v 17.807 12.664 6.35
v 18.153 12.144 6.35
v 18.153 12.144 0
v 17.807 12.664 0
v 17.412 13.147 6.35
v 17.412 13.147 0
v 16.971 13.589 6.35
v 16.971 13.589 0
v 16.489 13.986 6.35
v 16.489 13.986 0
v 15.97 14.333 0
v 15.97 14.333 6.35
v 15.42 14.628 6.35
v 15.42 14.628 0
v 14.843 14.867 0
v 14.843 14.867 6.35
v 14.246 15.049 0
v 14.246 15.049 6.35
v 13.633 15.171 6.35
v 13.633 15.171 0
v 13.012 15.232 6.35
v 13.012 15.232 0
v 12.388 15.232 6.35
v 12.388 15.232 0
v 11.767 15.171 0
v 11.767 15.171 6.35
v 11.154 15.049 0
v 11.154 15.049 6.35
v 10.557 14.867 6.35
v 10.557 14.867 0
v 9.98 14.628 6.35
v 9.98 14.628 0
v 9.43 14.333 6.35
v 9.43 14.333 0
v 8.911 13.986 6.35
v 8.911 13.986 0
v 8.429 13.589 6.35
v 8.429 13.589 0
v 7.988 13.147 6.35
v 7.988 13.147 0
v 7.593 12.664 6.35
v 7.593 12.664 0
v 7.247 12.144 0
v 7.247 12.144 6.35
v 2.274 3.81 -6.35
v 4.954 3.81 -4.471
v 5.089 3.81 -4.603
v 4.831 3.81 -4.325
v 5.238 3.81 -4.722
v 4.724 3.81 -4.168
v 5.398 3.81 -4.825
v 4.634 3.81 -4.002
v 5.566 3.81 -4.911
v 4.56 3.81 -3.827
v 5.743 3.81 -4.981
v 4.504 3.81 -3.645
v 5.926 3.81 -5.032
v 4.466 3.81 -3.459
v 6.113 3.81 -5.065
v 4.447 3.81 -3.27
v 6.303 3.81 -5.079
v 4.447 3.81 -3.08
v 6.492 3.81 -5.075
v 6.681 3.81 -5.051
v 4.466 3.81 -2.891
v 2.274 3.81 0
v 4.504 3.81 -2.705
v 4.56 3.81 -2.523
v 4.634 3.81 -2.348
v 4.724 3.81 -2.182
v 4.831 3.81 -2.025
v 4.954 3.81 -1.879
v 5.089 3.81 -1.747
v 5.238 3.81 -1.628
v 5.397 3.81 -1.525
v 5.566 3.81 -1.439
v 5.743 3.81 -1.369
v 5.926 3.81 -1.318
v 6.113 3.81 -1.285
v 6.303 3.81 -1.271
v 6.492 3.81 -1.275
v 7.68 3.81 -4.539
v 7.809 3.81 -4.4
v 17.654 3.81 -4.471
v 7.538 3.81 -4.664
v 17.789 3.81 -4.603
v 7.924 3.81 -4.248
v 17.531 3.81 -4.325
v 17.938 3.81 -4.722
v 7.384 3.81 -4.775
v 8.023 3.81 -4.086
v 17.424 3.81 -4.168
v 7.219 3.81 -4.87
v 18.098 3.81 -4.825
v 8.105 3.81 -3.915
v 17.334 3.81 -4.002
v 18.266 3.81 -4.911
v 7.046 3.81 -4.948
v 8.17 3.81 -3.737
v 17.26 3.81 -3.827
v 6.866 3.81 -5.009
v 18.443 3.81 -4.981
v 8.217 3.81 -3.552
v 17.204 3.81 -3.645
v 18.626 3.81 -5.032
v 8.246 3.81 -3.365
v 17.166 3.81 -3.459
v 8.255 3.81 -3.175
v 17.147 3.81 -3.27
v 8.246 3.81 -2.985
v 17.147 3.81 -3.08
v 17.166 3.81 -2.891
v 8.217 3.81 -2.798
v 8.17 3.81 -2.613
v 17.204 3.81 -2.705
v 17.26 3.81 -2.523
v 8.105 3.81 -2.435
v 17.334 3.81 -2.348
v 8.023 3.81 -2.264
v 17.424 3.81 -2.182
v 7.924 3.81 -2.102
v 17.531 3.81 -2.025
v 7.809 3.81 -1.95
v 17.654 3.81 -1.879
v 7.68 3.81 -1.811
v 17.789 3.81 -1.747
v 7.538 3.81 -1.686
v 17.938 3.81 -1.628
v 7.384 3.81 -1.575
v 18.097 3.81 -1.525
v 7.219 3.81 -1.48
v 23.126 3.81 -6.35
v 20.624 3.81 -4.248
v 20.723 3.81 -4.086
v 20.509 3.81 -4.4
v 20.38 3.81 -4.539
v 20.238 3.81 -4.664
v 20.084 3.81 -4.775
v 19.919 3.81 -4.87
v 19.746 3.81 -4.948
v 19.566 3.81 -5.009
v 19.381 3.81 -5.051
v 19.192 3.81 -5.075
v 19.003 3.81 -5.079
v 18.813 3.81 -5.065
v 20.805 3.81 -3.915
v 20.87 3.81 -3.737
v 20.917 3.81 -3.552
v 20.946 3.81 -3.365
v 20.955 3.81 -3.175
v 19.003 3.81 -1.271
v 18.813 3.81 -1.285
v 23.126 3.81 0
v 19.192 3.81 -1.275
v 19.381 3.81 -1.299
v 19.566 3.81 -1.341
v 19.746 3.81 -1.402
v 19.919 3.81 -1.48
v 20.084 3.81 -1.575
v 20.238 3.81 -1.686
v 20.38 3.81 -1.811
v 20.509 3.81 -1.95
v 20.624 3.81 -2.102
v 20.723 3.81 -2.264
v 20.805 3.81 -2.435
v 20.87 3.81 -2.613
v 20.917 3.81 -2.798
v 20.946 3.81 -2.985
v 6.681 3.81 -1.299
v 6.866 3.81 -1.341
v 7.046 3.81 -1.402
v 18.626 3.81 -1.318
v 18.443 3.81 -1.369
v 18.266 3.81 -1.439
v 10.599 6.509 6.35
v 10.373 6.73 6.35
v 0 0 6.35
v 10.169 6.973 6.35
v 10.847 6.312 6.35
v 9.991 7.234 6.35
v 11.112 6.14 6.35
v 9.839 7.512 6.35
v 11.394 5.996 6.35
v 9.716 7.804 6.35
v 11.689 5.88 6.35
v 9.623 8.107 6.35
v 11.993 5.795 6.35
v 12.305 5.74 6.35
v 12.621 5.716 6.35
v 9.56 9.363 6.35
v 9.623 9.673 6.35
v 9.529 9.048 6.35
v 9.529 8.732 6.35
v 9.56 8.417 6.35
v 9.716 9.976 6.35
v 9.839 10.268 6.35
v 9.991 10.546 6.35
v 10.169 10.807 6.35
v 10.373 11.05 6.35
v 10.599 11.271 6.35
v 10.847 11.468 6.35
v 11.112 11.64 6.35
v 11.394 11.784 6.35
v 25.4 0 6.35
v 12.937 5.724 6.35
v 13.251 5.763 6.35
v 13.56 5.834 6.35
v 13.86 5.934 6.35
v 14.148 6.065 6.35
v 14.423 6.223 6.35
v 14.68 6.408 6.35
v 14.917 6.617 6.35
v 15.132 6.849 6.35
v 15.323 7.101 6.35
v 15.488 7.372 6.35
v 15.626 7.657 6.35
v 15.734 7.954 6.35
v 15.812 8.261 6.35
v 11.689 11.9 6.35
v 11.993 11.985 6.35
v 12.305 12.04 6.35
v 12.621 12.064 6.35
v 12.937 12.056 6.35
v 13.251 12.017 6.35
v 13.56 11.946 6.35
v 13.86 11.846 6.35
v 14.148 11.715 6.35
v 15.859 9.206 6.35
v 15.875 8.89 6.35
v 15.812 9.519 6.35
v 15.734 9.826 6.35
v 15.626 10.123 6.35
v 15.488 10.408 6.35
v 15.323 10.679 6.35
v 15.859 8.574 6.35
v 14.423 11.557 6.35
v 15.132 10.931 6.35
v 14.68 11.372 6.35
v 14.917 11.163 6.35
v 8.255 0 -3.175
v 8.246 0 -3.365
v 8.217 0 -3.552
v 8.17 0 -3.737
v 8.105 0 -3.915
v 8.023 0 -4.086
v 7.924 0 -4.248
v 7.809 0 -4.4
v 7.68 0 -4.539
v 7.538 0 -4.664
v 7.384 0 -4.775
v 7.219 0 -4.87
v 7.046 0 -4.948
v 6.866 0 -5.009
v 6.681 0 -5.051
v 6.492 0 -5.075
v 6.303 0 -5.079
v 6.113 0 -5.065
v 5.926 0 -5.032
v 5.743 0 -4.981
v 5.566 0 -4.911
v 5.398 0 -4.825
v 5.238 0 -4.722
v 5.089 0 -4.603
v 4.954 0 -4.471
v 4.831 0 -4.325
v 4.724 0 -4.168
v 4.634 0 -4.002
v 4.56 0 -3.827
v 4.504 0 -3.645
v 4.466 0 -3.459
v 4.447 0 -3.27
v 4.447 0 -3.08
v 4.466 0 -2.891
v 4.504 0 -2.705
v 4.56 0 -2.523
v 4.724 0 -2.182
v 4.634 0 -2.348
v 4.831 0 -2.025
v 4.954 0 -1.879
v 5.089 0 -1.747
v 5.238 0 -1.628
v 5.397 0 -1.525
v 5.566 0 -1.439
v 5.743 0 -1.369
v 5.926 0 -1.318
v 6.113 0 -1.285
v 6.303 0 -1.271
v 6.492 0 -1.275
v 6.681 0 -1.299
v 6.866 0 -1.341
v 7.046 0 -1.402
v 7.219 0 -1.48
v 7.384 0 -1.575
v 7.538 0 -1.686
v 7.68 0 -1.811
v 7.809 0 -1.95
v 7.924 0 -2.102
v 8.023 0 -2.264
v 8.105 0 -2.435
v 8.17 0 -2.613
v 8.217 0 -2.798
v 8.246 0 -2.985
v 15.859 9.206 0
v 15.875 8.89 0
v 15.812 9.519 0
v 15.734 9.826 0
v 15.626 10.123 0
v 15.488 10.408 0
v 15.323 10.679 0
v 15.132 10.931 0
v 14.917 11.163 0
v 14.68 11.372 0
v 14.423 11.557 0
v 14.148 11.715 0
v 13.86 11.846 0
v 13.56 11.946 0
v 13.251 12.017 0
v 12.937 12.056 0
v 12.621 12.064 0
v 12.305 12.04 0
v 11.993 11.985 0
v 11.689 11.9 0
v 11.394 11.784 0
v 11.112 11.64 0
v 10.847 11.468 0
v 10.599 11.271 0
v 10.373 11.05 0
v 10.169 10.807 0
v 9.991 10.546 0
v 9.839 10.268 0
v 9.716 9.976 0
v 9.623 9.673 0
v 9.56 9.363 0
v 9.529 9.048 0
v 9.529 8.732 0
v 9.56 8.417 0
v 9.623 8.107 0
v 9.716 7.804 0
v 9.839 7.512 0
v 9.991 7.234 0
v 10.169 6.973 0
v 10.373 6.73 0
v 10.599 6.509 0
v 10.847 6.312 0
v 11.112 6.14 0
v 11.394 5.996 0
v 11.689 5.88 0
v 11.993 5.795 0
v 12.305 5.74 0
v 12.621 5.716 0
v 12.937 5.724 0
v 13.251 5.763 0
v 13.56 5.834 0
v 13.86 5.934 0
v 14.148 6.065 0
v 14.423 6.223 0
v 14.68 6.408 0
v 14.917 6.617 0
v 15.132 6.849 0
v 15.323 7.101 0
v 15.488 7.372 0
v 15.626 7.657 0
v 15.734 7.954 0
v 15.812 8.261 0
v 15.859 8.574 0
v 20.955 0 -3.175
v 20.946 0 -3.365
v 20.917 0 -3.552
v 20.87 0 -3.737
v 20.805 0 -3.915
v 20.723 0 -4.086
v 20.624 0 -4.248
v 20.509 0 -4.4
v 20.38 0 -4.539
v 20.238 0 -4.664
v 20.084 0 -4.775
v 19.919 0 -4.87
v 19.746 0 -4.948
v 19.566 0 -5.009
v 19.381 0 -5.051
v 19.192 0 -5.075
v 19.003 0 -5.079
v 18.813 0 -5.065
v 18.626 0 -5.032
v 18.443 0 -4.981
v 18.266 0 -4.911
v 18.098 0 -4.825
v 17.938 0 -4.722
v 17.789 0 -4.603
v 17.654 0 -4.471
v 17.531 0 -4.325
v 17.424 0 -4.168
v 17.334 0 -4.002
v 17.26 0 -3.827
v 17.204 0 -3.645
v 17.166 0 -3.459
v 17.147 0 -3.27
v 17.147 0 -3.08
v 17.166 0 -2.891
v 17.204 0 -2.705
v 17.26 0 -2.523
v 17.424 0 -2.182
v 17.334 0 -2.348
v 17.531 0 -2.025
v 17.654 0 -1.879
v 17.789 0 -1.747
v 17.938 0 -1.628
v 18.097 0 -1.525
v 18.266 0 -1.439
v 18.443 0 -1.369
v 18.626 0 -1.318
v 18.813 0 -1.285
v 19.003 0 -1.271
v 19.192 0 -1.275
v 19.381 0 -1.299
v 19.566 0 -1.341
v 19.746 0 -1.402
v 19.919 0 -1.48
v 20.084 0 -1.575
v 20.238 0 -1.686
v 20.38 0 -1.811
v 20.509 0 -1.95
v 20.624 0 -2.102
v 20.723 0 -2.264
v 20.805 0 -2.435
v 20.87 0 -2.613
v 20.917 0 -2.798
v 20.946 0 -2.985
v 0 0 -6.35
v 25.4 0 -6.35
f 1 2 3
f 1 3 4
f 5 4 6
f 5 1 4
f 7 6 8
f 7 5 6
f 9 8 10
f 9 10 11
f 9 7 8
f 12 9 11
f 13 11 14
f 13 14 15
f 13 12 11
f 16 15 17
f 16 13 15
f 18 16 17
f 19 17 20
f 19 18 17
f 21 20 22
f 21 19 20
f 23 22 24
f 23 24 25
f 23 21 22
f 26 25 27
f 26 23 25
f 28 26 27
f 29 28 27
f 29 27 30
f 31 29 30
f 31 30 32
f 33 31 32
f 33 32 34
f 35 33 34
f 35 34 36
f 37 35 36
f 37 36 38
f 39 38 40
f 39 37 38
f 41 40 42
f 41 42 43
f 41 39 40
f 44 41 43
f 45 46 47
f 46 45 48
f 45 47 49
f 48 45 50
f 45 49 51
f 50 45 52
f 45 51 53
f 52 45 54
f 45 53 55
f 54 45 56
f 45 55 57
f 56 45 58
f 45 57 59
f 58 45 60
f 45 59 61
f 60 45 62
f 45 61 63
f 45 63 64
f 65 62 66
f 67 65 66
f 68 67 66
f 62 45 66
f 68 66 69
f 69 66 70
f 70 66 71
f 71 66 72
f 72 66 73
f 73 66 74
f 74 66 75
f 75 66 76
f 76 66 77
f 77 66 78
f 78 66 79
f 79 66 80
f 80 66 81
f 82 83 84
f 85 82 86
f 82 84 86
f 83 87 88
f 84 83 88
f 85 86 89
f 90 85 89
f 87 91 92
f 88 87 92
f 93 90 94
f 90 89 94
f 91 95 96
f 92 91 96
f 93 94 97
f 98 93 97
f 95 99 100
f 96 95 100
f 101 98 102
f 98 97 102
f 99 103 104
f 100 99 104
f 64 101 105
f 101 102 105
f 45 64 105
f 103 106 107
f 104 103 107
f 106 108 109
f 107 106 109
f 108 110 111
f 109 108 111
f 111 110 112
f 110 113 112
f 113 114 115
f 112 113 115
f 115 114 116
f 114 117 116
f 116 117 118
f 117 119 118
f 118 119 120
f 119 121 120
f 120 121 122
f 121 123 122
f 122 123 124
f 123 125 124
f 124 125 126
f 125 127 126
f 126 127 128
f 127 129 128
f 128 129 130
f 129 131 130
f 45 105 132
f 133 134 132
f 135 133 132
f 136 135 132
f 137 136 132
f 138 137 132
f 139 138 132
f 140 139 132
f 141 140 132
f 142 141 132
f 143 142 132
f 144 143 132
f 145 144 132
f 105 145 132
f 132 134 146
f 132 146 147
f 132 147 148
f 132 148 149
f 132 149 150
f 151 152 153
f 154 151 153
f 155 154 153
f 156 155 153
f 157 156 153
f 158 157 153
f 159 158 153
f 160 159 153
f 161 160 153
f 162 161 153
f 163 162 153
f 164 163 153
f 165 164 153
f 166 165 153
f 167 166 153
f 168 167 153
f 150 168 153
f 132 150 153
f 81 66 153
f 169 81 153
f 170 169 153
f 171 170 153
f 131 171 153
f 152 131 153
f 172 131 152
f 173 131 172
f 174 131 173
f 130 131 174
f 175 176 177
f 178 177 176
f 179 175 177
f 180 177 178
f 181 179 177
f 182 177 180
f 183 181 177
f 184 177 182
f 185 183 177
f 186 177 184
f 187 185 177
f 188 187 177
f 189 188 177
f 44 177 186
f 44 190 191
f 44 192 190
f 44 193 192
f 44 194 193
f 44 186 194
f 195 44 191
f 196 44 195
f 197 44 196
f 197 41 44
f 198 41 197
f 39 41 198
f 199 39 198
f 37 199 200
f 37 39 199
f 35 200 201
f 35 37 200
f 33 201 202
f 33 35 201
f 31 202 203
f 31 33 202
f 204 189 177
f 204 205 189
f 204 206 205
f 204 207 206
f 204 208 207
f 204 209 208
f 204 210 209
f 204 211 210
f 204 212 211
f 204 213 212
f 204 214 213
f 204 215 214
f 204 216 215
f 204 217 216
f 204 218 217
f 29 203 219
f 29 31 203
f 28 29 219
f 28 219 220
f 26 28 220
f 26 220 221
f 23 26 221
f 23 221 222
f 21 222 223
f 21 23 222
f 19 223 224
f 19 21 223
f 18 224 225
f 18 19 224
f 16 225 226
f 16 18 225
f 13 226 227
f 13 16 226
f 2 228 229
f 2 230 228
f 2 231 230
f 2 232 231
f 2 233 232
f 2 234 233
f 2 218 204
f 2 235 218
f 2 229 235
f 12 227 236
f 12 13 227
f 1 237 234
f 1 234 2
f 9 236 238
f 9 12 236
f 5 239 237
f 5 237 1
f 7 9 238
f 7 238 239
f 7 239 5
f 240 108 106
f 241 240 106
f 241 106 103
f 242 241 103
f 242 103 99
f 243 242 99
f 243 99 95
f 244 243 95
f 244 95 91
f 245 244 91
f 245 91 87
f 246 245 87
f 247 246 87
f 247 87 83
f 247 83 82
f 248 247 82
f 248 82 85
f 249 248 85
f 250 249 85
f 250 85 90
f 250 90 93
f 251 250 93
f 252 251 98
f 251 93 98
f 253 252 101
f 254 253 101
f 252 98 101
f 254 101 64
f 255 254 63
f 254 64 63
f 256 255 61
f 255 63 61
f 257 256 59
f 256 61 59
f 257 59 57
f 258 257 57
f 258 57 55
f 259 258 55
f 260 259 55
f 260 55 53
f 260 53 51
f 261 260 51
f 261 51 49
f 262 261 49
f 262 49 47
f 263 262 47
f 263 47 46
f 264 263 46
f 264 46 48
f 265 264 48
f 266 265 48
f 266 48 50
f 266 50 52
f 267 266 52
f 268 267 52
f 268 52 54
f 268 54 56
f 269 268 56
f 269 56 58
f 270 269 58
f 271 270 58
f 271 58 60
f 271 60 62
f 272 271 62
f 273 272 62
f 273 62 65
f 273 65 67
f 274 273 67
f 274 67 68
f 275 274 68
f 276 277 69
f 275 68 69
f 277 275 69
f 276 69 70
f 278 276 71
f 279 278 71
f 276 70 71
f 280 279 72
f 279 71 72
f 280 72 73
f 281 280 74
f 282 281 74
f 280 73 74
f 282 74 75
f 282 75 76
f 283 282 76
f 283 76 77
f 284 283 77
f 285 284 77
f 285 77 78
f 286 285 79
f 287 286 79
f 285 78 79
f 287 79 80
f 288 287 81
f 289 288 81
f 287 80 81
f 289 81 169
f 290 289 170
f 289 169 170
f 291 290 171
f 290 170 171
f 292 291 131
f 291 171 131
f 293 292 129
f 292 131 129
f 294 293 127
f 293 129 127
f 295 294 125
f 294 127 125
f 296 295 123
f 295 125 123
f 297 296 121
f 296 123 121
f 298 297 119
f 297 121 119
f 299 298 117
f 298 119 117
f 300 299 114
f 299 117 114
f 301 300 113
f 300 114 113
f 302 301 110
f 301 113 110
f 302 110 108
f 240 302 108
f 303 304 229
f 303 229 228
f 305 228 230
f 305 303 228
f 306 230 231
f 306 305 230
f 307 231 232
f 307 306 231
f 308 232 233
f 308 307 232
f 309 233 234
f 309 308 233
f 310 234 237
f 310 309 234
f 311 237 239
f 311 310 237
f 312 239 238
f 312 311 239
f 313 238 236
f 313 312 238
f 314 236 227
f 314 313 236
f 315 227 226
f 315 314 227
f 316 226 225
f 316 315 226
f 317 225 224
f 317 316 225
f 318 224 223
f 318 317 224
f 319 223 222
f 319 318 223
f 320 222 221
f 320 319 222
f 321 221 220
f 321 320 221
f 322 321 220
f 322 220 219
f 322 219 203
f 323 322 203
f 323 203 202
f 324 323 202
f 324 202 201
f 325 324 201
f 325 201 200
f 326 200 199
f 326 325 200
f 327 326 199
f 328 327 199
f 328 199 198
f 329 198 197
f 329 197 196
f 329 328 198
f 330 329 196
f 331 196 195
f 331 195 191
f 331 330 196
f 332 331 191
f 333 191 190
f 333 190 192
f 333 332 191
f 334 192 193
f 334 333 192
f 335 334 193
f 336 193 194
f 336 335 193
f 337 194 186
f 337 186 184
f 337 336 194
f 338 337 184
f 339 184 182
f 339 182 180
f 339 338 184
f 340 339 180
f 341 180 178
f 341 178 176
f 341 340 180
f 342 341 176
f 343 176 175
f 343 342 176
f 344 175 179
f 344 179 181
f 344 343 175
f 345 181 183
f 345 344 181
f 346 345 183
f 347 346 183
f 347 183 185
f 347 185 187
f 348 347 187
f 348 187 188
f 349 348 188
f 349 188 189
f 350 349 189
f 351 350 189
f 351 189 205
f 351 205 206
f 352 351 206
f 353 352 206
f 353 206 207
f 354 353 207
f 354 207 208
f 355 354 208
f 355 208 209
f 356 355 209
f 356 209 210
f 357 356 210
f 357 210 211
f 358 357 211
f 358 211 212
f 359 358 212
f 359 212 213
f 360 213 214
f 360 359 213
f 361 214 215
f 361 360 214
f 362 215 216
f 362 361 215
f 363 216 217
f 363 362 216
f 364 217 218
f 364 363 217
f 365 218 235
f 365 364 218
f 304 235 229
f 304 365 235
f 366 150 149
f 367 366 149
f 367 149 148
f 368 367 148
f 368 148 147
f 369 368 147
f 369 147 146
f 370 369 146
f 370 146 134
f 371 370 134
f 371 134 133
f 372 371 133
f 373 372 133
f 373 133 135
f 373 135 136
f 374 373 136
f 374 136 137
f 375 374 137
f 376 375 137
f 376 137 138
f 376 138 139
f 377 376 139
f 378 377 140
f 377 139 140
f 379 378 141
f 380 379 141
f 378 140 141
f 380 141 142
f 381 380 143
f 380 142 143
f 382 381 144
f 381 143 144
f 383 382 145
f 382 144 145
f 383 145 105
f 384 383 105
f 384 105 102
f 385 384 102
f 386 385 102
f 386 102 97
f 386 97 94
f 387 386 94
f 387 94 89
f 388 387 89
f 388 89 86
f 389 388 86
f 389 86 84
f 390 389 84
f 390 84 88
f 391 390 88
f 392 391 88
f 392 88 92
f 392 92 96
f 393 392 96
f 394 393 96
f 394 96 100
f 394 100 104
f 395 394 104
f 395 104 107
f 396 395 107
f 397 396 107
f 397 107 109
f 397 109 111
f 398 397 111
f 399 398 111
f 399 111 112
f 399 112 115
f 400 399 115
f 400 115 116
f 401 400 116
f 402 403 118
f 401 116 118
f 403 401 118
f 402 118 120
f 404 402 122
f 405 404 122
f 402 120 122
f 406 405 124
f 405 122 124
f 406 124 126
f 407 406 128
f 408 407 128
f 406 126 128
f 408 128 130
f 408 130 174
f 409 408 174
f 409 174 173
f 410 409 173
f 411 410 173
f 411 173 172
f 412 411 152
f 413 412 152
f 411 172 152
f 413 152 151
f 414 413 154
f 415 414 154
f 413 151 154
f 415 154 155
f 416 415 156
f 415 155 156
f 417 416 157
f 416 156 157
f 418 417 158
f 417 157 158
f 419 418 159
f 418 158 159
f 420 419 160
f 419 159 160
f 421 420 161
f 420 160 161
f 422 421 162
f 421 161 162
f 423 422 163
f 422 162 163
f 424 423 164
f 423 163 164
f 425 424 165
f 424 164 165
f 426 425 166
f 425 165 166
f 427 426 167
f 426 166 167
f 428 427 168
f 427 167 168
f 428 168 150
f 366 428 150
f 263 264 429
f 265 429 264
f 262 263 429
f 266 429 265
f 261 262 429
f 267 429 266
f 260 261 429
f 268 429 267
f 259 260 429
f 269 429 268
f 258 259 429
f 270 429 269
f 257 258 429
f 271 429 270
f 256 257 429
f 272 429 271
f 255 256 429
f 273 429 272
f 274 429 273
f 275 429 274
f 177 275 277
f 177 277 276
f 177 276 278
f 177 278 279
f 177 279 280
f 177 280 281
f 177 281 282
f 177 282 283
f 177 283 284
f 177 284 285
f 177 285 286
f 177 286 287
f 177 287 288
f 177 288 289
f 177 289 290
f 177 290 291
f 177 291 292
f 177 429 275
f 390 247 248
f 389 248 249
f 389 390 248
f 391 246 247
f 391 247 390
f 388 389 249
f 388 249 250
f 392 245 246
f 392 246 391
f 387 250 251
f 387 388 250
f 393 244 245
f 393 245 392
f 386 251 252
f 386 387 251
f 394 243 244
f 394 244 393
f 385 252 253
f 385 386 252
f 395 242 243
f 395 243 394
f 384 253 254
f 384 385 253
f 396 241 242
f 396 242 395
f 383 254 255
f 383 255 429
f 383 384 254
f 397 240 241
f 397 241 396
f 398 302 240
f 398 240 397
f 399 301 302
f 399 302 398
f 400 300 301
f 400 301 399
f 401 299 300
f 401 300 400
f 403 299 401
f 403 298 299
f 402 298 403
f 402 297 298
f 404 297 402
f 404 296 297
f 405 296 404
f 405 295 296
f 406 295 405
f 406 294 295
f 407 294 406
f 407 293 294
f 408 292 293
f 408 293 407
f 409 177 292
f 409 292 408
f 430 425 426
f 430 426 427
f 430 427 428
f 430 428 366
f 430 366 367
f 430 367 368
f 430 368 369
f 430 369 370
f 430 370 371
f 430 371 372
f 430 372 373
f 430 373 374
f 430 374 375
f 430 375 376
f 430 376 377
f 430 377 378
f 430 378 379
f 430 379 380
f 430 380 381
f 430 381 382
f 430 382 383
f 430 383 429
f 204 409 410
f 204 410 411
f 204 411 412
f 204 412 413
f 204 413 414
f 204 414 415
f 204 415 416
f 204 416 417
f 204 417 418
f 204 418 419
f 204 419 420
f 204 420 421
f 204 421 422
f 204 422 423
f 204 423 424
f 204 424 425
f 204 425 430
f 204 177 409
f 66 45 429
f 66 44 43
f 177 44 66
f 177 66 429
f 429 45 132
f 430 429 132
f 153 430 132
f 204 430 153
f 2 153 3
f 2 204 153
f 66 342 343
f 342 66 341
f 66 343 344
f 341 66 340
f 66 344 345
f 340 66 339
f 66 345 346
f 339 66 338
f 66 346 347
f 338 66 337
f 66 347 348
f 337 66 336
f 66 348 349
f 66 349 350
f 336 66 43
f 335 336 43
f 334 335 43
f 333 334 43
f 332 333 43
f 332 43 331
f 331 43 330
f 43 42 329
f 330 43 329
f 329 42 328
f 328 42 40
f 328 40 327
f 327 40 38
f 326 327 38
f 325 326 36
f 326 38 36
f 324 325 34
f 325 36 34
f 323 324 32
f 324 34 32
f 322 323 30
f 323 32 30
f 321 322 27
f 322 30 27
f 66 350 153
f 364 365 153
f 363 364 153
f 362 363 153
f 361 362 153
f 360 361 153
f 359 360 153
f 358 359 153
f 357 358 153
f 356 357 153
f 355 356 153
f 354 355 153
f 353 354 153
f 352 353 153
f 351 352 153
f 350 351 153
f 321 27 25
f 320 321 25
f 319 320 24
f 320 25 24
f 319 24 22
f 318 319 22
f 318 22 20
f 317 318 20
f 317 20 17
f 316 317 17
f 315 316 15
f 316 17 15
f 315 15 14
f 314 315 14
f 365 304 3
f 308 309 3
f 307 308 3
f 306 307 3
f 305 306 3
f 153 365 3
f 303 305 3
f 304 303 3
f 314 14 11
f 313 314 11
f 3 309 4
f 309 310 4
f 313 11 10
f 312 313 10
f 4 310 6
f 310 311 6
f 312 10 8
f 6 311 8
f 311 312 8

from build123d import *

# Parameters (mm, degrees)
SKETCH2_R           = 3.175
BOSS_EXTRUDE2_DEPTH = 6.35
SKETCH6_W           = 20.852651852
SKETCH6_H           = 11.43
CUT_EXTRUDE3_DEPTH  = 6.35
SKETCH7_R           = 1.905
CUT_EXTRUDE4_DEPTH  = 6.35


with BuildPart() as part:
    # Sketch2 → Boss-Extrude2 (new body, symmetric)
    with BuildSketch(Plane.XY):
        with BuildLine():
            Line((0, 0), (25.4, 0))
            Line((25.4, 0), (18.152847328, 12.144067611))
            ThreePointArc((18.152847328, 12.144067611), (12.7, 15.24), (7.247152672, 12.144067611))
            Line((7.247152672, 12.144067611), (0, 0))
        make_face()
        with Locations((12.7, 8.89)):
            Circle(SKETCH2_R, mode=Mode.SUBTRACT)
    extrude(amount=BOSS_EXTRUDE2_DEPTH, both=True)

    # Sketch6 → Cut-Extrude3 (cut)
    with BuildSketch(Plane.XY):
        with Locations((12.7, 9.525)):
            Rectangle(SKETCH6_W, SKETCH6_H)
    extrude(amount=-CUT_EXTRUDE3_DEPTH, mode=Mode.SUBTRACT)

    # Sketch7 → Cut-Extrude4 (cut)
    with BuildSketch(Plane(origin=(0, 3.81, 0), x_dir=(1, 0, 0), z_dir=(0, 1, 0))):
        with Locations((6.35, 3.175)):
            Circle(SKETCH7_R)
        with Locations((19.05, 3.175)):
            Circle(SKETCH7_R)
    extrude(amount=-CUT_EXTRUDE4_DEPTH, mode=Mode.SUBTRACT)


solid = part.part
